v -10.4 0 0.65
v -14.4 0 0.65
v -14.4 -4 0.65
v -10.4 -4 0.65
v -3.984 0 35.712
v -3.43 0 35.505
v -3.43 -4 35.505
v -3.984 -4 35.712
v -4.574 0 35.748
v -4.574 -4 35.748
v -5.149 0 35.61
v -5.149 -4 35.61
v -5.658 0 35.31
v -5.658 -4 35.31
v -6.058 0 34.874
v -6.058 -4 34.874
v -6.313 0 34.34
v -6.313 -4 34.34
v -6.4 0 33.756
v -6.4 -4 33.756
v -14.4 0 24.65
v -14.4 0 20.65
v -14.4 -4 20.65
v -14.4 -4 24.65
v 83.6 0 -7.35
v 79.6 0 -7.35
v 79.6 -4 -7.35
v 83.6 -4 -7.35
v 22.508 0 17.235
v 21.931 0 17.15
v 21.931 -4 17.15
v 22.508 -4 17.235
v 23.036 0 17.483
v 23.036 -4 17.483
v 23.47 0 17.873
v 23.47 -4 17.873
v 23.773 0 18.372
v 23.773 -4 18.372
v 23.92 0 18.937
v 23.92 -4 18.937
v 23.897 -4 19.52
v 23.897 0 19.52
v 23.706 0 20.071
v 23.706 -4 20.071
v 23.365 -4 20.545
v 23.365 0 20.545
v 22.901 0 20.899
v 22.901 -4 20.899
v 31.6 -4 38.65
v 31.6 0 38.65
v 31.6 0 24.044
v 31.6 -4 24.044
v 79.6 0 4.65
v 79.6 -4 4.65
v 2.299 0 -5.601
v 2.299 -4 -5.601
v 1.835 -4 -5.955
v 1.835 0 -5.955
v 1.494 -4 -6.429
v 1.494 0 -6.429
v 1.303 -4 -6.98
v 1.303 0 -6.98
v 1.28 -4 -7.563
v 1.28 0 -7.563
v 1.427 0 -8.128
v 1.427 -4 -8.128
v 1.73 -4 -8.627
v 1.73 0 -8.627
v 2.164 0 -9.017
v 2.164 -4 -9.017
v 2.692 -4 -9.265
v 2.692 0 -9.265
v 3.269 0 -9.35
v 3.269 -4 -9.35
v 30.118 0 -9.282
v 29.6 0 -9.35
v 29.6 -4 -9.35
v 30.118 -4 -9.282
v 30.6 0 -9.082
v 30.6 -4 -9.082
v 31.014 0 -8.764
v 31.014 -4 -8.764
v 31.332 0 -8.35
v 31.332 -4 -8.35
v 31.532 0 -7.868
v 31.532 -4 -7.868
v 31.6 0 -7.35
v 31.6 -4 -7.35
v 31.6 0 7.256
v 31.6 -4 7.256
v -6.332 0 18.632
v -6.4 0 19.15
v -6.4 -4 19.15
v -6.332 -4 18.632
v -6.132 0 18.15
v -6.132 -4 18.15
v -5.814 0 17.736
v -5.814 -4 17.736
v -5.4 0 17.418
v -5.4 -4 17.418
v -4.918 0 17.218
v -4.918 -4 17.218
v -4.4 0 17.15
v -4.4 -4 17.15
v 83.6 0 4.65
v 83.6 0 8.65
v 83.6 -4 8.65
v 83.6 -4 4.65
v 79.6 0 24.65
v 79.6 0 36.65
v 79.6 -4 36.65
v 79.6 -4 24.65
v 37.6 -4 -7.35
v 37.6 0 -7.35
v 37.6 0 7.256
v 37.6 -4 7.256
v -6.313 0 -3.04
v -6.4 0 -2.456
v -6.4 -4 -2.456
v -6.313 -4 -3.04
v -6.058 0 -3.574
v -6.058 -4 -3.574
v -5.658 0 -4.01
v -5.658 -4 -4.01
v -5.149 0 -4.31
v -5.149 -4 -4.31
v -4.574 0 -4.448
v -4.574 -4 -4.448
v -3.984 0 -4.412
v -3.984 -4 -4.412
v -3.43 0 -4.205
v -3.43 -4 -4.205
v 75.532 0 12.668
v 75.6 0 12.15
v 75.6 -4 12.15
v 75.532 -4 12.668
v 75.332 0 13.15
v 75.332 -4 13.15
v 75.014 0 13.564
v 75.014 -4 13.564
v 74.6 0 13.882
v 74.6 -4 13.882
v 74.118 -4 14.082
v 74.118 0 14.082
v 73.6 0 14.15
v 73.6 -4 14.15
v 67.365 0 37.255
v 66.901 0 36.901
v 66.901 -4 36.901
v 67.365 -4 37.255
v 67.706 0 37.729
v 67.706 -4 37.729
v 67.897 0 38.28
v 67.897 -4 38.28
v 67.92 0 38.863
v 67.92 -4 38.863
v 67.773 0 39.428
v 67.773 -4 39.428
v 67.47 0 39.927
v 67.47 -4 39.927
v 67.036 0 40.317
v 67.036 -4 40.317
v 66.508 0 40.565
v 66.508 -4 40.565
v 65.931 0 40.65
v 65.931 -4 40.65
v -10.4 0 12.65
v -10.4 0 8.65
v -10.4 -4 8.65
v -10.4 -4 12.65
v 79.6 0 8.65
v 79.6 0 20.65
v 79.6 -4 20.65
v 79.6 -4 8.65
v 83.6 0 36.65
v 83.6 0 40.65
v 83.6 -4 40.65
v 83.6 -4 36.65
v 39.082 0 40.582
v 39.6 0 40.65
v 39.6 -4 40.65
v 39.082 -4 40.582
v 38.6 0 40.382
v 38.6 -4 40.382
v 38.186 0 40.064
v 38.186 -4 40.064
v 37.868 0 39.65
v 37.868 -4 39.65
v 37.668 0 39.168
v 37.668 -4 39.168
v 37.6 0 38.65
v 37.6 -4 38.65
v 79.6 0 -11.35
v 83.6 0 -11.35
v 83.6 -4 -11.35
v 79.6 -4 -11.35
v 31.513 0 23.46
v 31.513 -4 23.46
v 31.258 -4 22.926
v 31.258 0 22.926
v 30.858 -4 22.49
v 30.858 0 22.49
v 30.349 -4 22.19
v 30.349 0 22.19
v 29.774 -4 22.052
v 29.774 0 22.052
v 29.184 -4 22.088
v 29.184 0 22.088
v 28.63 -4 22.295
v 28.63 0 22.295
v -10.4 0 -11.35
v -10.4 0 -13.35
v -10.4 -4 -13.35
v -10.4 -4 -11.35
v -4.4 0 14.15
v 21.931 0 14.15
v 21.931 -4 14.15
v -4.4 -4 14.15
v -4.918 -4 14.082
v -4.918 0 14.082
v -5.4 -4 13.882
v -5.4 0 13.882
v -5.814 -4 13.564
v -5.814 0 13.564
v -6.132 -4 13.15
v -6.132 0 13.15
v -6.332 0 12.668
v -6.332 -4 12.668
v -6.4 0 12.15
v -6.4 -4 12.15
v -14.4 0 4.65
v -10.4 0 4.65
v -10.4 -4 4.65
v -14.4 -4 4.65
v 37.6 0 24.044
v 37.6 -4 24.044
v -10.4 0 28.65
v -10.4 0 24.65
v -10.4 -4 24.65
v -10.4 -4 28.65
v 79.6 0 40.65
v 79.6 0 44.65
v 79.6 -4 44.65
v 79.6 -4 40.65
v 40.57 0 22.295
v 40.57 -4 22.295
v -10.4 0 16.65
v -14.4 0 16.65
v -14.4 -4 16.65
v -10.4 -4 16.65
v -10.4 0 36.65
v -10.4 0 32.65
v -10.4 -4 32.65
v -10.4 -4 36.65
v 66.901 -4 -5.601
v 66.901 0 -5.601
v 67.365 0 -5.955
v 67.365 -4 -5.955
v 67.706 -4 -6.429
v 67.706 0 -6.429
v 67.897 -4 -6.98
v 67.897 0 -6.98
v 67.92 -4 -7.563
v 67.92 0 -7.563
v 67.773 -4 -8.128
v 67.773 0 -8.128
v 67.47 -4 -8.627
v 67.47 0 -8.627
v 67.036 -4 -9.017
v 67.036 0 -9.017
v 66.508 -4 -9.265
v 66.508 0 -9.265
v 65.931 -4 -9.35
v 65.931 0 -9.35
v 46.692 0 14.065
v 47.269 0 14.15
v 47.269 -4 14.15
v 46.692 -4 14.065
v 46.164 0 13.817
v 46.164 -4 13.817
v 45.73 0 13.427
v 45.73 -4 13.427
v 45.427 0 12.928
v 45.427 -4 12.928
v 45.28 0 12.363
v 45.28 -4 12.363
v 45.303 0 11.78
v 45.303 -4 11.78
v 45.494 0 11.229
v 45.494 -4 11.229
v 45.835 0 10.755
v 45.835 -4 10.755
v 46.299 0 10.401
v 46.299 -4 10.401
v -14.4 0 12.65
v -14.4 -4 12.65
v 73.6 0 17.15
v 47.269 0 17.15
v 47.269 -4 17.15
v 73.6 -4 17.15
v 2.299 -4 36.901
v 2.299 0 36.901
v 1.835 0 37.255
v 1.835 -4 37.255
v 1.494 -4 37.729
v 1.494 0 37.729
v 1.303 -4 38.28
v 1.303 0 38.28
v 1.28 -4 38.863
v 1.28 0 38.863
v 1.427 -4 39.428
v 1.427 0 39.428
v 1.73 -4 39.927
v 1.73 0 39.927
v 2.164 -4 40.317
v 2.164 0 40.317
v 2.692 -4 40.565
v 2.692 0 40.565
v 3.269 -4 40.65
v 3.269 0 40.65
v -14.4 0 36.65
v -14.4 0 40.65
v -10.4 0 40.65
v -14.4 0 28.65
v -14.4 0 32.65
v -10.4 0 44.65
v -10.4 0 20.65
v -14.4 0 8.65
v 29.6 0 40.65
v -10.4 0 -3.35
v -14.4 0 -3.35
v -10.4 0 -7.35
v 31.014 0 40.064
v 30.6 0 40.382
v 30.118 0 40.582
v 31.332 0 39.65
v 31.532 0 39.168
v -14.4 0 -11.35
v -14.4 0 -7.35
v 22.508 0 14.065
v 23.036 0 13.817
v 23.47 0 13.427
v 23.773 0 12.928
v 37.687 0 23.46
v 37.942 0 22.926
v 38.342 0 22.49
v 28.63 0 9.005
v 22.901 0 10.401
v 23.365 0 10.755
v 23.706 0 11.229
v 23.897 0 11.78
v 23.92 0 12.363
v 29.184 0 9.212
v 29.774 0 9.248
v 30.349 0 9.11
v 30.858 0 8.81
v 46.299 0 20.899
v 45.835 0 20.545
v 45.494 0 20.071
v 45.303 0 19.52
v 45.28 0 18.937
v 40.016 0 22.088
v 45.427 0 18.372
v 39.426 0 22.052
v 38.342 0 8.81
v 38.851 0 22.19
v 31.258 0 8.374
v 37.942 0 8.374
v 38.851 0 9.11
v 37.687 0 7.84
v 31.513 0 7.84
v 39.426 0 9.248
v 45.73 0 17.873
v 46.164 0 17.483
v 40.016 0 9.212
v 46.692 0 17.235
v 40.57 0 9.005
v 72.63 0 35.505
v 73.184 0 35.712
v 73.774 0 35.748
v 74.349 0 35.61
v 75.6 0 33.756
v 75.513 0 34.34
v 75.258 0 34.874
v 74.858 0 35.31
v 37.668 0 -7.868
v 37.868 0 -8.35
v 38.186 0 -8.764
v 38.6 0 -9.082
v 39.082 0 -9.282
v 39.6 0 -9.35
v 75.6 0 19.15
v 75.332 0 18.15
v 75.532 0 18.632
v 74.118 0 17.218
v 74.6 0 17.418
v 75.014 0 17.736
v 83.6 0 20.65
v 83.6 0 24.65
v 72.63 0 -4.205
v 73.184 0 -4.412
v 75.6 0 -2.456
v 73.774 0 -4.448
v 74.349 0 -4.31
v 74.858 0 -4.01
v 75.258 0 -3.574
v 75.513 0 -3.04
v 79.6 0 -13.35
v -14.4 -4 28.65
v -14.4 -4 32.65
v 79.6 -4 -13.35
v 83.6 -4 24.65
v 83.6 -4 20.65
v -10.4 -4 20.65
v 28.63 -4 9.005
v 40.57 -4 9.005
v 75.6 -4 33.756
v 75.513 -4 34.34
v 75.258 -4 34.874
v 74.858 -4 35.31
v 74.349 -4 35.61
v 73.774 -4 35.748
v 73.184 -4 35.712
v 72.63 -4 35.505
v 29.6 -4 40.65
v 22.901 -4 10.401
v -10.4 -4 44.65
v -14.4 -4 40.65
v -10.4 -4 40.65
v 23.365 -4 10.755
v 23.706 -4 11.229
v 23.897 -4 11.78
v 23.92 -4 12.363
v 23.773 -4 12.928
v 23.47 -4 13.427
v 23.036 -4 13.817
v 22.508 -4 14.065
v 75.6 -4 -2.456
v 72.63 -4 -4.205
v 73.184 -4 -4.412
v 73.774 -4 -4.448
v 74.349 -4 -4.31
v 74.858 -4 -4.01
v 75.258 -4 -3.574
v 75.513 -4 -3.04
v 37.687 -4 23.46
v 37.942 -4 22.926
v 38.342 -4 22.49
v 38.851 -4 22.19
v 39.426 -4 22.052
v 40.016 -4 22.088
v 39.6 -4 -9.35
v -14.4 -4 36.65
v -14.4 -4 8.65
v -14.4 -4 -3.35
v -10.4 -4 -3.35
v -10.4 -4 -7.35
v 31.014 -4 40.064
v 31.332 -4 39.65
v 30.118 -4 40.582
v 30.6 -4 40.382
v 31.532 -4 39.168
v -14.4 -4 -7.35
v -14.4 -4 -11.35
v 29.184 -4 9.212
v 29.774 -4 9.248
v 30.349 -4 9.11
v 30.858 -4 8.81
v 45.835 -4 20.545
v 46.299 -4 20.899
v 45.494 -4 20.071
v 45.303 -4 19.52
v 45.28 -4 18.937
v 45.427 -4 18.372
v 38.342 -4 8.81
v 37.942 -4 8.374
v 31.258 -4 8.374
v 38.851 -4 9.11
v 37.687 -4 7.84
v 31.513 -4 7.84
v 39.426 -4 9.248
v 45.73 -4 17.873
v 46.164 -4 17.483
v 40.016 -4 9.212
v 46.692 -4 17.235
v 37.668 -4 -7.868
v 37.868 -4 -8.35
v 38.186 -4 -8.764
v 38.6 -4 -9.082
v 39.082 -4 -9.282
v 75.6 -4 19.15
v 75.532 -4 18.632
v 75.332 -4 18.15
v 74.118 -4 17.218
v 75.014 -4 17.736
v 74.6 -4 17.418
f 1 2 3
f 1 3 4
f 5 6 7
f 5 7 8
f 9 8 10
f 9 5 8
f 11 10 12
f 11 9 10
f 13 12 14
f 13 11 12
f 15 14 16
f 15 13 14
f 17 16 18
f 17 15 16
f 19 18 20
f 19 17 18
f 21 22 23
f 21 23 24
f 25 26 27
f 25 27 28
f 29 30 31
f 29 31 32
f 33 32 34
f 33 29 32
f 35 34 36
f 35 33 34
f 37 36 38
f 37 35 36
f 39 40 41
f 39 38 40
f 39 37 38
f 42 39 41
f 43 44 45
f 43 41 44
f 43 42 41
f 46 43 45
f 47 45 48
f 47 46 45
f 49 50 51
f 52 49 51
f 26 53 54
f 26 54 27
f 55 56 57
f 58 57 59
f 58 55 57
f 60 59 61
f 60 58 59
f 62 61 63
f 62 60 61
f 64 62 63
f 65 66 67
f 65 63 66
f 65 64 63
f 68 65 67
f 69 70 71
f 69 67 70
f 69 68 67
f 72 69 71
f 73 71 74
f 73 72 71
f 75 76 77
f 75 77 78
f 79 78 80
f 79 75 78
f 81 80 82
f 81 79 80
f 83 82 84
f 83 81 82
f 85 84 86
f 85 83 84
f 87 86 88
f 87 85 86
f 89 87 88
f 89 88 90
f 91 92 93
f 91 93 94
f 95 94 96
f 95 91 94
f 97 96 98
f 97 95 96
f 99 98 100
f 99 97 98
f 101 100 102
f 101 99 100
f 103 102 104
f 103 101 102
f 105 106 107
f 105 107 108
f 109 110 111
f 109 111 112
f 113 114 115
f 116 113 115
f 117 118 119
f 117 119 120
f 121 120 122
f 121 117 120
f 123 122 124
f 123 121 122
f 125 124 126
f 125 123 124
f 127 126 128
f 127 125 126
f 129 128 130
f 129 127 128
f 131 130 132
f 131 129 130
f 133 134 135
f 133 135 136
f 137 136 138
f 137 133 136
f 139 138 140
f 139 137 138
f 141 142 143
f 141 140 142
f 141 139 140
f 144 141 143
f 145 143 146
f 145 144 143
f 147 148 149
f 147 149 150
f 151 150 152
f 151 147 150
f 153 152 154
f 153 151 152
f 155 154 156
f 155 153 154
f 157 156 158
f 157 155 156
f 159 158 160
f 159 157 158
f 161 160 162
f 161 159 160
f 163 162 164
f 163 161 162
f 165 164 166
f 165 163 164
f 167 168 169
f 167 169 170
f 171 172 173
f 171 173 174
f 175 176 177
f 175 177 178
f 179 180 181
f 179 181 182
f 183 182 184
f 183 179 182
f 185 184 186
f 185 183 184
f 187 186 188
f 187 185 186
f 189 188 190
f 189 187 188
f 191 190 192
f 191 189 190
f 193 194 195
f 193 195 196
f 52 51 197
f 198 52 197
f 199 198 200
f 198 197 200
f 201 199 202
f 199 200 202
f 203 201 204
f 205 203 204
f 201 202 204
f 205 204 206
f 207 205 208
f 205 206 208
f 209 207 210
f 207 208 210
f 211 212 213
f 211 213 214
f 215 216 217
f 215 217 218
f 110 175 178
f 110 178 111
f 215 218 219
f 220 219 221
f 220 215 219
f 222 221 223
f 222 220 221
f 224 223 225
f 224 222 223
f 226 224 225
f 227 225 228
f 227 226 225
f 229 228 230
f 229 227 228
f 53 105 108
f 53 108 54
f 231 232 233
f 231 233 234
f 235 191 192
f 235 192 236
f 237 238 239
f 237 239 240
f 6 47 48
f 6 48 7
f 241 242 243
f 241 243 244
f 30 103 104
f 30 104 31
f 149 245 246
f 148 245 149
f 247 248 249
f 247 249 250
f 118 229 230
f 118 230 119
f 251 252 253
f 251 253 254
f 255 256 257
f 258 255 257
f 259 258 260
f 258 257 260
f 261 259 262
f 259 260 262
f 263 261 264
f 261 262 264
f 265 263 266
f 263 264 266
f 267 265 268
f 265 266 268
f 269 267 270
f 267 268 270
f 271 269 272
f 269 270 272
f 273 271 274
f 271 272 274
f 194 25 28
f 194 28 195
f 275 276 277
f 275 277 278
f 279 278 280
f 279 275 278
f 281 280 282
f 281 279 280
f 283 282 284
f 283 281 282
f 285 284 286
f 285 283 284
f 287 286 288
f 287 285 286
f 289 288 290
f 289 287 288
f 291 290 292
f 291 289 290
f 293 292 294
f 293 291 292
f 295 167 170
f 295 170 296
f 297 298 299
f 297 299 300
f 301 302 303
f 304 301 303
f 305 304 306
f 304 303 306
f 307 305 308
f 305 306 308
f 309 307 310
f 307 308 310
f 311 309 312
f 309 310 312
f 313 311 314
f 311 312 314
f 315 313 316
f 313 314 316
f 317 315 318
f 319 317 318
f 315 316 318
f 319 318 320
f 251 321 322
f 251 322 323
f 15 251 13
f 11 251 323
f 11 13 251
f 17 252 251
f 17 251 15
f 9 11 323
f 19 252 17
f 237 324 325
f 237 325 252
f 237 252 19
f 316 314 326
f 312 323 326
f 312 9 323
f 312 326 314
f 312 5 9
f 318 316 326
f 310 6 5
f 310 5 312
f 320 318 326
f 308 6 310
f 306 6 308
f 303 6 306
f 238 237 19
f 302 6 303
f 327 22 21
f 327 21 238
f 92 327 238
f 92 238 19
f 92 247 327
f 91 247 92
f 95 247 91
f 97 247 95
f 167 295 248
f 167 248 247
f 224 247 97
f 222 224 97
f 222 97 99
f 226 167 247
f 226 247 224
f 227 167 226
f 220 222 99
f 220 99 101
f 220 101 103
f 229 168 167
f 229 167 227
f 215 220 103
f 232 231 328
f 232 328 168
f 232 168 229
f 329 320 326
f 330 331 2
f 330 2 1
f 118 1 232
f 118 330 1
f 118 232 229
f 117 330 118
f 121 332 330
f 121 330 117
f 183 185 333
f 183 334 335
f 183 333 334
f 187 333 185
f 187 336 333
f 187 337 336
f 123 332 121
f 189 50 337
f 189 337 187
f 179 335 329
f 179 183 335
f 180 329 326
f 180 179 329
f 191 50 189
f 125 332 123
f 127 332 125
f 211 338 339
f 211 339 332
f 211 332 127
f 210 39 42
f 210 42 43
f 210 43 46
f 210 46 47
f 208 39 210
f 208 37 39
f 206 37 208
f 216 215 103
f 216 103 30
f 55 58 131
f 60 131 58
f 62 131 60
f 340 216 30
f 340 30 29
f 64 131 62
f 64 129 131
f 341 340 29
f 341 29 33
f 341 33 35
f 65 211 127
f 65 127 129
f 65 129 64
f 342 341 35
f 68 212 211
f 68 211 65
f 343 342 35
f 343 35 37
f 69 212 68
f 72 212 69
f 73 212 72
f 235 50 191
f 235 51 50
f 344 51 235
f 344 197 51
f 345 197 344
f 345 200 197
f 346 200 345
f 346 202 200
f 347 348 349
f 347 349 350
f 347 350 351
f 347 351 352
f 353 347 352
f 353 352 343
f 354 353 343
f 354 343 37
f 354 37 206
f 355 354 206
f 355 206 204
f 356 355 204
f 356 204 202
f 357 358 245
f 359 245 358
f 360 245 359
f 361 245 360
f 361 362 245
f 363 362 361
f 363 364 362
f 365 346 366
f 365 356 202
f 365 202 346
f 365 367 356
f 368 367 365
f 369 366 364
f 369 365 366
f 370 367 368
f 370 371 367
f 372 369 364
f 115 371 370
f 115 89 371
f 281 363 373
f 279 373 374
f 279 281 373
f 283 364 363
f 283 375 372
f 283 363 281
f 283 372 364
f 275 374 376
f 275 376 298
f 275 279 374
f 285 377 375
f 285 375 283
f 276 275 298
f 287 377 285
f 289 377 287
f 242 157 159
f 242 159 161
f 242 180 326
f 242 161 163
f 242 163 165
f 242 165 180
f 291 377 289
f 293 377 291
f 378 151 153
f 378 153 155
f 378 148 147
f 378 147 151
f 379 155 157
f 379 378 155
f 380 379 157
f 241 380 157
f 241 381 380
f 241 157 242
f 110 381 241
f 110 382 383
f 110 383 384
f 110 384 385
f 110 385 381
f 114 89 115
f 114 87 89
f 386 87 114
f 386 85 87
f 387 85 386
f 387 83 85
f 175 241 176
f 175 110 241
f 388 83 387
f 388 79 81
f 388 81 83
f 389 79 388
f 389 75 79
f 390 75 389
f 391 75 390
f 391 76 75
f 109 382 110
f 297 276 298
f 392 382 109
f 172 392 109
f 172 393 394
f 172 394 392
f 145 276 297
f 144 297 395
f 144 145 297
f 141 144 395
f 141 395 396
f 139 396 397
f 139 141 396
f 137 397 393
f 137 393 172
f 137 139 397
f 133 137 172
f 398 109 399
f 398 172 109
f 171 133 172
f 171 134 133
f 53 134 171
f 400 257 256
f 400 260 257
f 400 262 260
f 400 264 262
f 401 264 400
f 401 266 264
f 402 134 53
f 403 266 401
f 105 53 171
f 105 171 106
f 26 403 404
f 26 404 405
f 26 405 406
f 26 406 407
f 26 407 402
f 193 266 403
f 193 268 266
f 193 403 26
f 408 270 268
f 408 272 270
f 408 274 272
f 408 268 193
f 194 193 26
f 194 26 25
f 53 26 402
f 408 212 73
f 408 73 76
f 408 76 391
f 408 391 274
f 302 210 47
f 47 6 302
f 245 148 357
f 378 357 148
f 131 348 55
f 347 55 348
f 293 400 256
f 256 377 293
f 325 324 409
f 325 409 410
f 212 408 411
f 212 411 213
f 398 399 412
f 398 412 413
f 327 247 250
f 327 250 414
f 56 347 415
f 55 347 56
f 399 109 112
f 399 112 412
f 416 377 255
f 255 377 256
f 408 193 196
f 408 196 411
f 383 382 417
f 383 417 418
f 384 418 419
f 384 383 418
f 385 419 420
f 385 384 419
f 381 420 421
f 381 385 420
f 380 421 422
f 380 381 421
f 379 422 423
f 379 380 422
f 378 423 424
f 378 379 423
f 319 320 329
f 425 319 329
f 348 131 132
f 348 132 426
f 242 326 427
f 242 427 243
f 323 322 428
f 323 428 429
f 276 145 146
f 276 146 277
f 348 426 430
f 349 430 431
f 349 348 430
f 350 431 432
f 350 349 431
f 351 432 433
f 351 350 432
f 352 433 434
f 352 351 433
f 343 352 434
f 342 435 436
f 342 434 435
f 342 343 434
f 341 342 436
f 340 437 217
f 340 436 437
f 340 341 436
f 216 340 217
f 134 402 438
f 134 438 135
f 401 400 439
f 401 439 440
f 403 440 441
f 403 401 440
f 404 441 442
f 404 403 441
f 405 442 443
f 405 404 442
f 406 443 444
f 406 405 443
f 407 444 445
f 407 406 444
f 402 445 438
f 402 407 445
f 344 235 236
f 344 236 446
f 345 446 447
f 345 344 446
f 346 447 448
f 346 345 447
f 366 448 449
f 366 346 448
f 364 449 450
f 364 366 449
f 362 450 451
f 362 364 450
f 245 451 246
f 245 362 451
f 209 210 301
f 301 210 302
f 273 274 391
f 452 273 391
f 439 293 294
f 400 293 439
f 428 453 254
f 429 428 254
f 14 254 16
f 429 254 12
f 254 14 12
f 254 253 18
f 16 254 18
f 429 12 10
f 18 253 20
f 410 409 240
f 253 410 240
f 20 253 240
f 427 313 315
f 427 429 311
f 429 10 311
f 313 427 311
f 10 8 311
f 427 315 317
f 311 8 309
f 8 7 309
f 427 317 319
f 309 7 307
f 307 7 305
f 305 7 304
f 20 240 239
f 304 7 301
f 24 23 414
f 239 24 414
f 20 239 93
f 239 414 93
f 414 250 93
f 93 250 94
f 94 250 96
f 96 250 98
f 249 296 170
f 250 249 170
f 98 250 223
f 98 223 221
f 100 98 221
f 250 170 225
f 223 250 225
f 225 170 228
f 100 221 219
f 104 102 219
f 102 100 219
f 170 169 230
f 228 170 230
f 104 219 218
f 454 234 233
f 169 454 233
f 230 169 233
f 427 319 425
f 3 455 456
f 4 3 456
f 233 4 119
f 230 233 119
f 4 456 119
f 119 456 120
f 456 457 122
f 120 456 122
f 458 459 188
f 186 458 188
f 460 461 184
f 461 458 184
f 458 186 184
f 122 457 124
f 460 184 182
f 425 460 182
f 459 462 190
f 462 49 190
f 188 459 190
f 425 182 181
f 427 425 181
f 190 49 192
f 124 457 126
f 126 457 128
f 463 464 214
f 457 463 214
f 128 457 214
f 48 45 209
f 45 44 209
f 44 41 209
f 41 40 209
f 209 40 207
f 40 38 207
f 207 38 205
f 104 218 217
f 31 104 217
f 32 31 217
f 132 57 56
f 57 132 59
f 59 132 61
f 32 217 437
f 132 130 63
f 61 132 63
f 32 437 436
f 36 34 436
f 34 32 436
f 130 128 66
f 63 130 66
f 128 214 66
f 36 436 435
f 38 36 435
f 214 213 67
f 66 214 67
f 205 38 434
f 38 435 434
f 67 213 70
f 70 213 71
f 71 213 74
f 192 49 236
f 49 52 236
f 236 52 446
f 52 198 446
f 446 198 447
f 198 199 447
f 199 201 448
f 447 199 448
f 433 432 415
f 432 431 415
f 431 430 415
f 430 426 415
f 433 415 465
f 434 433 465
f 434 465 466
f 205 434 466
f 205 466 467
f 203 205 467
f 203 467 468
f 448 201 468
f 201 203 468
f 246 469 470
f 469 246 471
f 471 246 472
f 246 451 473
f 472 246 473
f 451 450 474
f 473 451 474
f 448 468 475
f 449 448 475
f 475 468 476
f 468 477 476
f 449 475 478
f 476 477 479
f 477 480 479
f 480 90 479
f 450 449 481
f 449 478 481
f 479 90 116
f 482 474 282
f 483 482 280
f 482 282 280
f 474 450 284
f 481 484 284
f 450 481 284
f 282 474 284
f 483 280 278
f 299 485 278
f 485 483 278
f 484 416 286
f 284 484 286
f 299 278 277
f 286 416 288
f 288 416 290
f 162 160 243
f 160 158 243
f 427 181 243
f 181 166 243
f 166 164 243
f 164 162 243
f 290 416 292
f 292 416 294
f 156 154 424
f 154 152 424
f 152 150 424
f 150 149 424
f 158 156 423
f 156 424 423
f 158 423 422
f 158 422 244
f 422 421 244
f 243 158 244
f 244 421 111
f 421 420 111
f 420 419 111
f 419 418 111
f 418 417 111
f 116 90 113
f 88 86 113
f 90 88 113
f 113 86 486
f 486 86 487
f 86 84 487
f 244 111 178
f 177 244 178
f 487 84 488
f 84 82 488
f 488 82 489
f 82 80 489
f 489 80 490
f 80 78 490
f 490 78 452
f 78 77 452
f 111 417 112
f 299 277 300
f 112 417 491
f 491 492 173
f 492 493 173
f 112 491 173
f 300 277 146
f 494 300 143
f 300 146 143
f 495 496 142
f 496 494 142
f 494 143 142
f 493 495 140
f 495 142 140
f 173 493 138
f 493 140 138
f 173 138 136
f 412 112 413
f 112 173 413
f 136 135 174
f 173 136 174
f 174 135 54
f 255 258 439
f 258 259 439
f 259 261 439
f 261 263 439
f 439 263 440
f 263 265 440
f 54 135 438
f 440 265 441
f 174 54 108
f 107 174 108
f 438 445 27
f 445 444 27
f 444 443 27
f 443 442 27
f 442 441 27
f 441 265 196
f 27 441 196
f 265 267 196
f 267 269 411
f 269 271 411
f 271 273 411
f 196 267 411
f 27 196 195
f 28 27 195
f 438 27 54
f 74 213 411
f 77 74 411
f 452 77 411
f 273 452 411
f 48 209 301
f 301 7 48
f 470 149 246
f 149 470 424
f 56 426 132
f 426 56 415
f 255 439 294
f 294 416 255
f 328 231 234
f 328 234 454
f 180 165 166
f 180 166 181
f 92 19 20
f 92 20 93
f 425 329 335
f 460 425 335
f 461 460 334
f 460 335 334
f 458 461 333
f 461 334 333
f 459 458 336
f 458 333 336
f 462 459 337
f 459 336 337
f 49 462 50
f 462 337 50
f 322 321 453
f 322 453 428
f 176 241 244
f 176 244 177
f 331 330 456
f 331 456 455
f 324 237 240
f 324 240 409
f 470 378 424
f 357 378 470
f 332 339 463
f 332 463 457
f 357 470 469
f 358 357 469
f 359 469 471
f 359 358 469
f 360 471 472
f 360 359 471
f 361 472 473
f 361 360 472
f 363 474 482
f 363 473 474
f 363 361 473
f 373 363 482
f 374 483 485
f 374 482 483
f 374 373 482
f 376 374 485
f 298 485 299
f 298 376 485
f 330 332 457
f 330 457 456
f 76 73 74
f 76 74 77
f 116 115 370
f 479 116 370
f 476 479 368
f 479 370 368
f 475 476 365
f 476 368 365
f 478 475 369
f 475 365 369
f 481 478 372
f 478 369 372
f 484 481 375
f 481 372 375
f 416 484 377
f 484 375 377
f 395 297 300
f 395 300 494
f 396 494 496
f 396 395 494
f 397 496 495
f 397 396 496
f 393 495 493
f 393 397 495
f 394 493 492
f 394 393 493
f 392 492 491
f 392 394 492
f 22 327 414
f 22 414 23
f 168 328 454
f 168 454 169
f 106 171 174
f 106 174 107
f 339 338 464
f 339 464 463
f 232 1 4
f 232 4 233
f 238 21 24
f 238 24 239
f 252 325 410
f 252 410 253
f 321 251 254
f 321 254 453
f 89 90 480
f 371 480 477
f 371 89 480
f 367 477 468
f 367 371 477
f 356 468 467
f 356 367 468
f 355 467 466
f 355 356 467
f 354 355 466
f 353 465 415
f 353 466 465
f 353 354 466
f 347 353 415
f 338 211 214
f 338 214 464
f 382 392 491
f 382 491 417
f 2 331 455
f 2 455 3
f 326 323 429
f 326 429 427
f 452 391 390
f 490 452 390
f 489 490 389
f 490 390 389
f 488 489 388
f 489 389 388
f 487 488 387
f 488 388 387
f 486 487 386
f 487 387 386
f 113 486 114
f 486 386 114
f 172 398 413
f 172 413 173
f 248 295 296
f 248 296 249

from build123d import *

# Parameters (mm, degrees)
BOSS_EXTRUDE1_DEPTH = 4
CUT_EXTRUDE1_DEPTH  = 10


with BuildPart() as part:
    # Sketch1 → Boss-Extrude1 (new body)
    with BuildSketch(Plane(origin=(0, 0, 0), x_dir=(1, 0, 0), z_dir=(0, 1, 0))):
        Polygon((-10.4, 13.35), (-10.4, 11.35), (-14.4, 11.35), (-14.4, 7.35), (-10.4, 7.35), (-10.4, 3.35), (-14.4, 3.35), (-14.4, -0.65), (-10.4, -0.65), (-10.4, -4.65), (-14.4, -4.65), (-14.4, -8.65), (-10.4, -8.65), (-10.4, -12.65), (-14.4, -12.65), (-14.4, -16.65), (-10.4, -16.65), (-10.4, -20.65), (-14.4, -20.65), (-14.4, -24.65), (-10.4, -24.65), (-10.4, -28.65), (-14.4, -28.65), (-14.4, -32.65), (-10.4, -32.65), (-10.4, -36.65), (-14.4, -36.65), (-14.4, -40.65), (-10.4, -40.65), (-10.4, -44.65), (79.6, -44.65), (79.6, -40.65), (83.6, -40.65), (83.6, -36.65), (79.6, -36.65), (79.6, -24.65), (83.6, -24.65), (83.6, -20.65), (79.6, -20.65), (79.6, -8.65), (83.6, -8.65), (83.6, -4.65), (79.6, -4.65), (79.6, 7.35), (83.6, 7.35), (83.6, 11.35), (79.6, 11.35), (79.6, 13.35), align=None)
    extrude(amount=-BOSS_EXTRUDE1_DEPTH)

    # Sketch2 → Cut-Extrude1 (cut)
    with BuildSketch(Plane(origin=(0, 0, 0), x_dir=(1, 0, 0), z_dir=(0, 1, 0))):
        with BuildLine():
            Line((3.269007855, 9.35), (29.6, 9.35))
            ThreePointArc((29.6, 9.35), (31.014213562, 8.764213562), (31.6, 7.35))
            Line((31.6, 7.35), (31.6, -7.255623888))
            ThreePointArc((31.6, -7.255623888), (30.61482352, -8.979031334), (28.629866776, -9.004578298))
            Line((28.629866776, -9.004578298), (2.29887463, 5.60104559))
            ThreePointArc((2.29887463, 5.60104559), (1.332786171, 7.851044499), (3.269007855, 9.35))
        make_face()
        with BuildLine():
            ThreePointArc((-6.4, 2.455623888), (-5.41482352, 4.179031334), (-3.429866776, 4.204578298))
            Line((-3.429866776, 4.204578298), (22.90112537, -10.40104559))
            ThreePointArc((22.90112537, -10.40104559), (23.867213829, -12.651044499), (21.930992145, -14.15))
            Line((21.930992145, -14.15), (-4.4, -14.15))
            ThreePointArc((-4.4, -14.15), (-5.814213562, -13.564213562), (-6.4, -12.15))
            Line((-6.4, -12.15), (-6.4, 2.455623888))
        make_face()
        with BuildLine():
            ThreePointArc((-6.4, -19.15), (-5.814213562, -17.735786438), (-4.4, -17.15))
            Line((-4.4, -17.15), (21.930992145, -17.15))
            ThreePointArc((21.930992145, -17.15), (23.867213829, -18.648955501), (22.90112537, -20.89895441))
            Line((22.90112537, -20.89895441), (-3.429866776, -35.504578298))
            ThreePointArc((-3.429866776, -35.504578298), (-5.41482352, -35.479031334), (-6.4, -33.755623888))
            Line((-6.4, -33.755623888), (-6.4, -19.15))
        make_face()
        with BuildLine():
            Line((31.6, -38.65), (31.6, -24.044376112))
            ThreePointArc((31.6, -24.044376112), (30.61482352, -22.320968666), (28.629866776, -22.295421702))
            Line((28.629866776, -22.295421702), (2.29887463, -36.90104559))
            ThreePointArc((2.29887463, -36.90104559), (1.332786171, -39.151044499), (3.269007855, -40.65))
            Line((3.269007855, -40.65), (29.6, -40.65))
            ThreePointArc((29.6, -40.65), (31.014213562, -40.064213562), (31.6, -38.65))
        make_face()
        with BuildLine():
            Line((65.930992145, -40.65), (39.6, -40.65))
            ThreePointArc((39.6, -40.65), (38.185786438, -40.064213562), (37.6, -38.65))
            Line((37.6, -38.65), (37.6, -24.044376112))
            ThreePointArc((37.6, -24.044376112), (38.58517648, -22.320968666), (40.570133224, -22.295421702))
            Line((40.570133224, -22.295421702), (66.90112537, -36.90104559))
            ThreePointArc((66.90112537, -36.90104559), (67.867213829, -39.151044499), (65.930992145, -40.65))
        make_face()
        with BuildLine():
            ThreePointArc((75.6, -33.755623888), (74.61482352, -35.479031334), (72.629866776, -35.504578298))
            Line((72.629866776, -35.504578298), (46.29887463, -20.89895441))
            ThreePointArc((46.29887463, -20.89895441), (45.332786171, -18.648955501), (47.269007855, -17.15))
            Line((47.269007855, -17.15), (73.6, -17.15))
            ThreePointArc((73.6, -17.15), (75.014213562, -17.735786438), (75.6, -19.15))
            Line((75.6, -19.15), (75.6, -33.755623888))
        make_face()
        with BuildLine():
            ThreePointArc((75.6, -12.15), (75.014213562, -13.564213562), (73.6, -14.15))
            Line((73.6, -14.15), (47.269007855, -14.15))
            ThreePointArc((47.269007855, -14.15), (45.332786171, -12.651044499), (46.29887463, -10.40104559))
            Line((46.29887463, -10.40104559), (72.629866776, 4.204578298))
            ThreePointArc((72.629866776, 4.204578298), (74.61482352, 4.179031334), (75.6, 2.455623888))
            Line((75.6, 2.455623888), (75.6, -12.15))
        make_face()
        with BuildLine():
            Line((37.6, 7.35), (37.6, -7.255623888))
            ThreePointArc((37.6, -7.255623888), (38.58517648, -8.979031334), (40.570133224, -9.004578298))
            Line((40.570133224, -9.004578298), (66.90112537, 5.60104559))
            ThreePointArc((66.90112537, 5.60104559), (67.867213829, 7.851044499), (65.930992145, 9.35))
            Line((65.930992145, 9.35), (39.6, 9.35))
            ThreePointArc((39.6, 9.35), (38.185786438, 8.764213562), (37.6, 7.35))
        make_face()
    extrude(amount=-CUT_EXTRUDE1_DEPTH, mode=Mode.SUBTRACT)


solid = part.part
